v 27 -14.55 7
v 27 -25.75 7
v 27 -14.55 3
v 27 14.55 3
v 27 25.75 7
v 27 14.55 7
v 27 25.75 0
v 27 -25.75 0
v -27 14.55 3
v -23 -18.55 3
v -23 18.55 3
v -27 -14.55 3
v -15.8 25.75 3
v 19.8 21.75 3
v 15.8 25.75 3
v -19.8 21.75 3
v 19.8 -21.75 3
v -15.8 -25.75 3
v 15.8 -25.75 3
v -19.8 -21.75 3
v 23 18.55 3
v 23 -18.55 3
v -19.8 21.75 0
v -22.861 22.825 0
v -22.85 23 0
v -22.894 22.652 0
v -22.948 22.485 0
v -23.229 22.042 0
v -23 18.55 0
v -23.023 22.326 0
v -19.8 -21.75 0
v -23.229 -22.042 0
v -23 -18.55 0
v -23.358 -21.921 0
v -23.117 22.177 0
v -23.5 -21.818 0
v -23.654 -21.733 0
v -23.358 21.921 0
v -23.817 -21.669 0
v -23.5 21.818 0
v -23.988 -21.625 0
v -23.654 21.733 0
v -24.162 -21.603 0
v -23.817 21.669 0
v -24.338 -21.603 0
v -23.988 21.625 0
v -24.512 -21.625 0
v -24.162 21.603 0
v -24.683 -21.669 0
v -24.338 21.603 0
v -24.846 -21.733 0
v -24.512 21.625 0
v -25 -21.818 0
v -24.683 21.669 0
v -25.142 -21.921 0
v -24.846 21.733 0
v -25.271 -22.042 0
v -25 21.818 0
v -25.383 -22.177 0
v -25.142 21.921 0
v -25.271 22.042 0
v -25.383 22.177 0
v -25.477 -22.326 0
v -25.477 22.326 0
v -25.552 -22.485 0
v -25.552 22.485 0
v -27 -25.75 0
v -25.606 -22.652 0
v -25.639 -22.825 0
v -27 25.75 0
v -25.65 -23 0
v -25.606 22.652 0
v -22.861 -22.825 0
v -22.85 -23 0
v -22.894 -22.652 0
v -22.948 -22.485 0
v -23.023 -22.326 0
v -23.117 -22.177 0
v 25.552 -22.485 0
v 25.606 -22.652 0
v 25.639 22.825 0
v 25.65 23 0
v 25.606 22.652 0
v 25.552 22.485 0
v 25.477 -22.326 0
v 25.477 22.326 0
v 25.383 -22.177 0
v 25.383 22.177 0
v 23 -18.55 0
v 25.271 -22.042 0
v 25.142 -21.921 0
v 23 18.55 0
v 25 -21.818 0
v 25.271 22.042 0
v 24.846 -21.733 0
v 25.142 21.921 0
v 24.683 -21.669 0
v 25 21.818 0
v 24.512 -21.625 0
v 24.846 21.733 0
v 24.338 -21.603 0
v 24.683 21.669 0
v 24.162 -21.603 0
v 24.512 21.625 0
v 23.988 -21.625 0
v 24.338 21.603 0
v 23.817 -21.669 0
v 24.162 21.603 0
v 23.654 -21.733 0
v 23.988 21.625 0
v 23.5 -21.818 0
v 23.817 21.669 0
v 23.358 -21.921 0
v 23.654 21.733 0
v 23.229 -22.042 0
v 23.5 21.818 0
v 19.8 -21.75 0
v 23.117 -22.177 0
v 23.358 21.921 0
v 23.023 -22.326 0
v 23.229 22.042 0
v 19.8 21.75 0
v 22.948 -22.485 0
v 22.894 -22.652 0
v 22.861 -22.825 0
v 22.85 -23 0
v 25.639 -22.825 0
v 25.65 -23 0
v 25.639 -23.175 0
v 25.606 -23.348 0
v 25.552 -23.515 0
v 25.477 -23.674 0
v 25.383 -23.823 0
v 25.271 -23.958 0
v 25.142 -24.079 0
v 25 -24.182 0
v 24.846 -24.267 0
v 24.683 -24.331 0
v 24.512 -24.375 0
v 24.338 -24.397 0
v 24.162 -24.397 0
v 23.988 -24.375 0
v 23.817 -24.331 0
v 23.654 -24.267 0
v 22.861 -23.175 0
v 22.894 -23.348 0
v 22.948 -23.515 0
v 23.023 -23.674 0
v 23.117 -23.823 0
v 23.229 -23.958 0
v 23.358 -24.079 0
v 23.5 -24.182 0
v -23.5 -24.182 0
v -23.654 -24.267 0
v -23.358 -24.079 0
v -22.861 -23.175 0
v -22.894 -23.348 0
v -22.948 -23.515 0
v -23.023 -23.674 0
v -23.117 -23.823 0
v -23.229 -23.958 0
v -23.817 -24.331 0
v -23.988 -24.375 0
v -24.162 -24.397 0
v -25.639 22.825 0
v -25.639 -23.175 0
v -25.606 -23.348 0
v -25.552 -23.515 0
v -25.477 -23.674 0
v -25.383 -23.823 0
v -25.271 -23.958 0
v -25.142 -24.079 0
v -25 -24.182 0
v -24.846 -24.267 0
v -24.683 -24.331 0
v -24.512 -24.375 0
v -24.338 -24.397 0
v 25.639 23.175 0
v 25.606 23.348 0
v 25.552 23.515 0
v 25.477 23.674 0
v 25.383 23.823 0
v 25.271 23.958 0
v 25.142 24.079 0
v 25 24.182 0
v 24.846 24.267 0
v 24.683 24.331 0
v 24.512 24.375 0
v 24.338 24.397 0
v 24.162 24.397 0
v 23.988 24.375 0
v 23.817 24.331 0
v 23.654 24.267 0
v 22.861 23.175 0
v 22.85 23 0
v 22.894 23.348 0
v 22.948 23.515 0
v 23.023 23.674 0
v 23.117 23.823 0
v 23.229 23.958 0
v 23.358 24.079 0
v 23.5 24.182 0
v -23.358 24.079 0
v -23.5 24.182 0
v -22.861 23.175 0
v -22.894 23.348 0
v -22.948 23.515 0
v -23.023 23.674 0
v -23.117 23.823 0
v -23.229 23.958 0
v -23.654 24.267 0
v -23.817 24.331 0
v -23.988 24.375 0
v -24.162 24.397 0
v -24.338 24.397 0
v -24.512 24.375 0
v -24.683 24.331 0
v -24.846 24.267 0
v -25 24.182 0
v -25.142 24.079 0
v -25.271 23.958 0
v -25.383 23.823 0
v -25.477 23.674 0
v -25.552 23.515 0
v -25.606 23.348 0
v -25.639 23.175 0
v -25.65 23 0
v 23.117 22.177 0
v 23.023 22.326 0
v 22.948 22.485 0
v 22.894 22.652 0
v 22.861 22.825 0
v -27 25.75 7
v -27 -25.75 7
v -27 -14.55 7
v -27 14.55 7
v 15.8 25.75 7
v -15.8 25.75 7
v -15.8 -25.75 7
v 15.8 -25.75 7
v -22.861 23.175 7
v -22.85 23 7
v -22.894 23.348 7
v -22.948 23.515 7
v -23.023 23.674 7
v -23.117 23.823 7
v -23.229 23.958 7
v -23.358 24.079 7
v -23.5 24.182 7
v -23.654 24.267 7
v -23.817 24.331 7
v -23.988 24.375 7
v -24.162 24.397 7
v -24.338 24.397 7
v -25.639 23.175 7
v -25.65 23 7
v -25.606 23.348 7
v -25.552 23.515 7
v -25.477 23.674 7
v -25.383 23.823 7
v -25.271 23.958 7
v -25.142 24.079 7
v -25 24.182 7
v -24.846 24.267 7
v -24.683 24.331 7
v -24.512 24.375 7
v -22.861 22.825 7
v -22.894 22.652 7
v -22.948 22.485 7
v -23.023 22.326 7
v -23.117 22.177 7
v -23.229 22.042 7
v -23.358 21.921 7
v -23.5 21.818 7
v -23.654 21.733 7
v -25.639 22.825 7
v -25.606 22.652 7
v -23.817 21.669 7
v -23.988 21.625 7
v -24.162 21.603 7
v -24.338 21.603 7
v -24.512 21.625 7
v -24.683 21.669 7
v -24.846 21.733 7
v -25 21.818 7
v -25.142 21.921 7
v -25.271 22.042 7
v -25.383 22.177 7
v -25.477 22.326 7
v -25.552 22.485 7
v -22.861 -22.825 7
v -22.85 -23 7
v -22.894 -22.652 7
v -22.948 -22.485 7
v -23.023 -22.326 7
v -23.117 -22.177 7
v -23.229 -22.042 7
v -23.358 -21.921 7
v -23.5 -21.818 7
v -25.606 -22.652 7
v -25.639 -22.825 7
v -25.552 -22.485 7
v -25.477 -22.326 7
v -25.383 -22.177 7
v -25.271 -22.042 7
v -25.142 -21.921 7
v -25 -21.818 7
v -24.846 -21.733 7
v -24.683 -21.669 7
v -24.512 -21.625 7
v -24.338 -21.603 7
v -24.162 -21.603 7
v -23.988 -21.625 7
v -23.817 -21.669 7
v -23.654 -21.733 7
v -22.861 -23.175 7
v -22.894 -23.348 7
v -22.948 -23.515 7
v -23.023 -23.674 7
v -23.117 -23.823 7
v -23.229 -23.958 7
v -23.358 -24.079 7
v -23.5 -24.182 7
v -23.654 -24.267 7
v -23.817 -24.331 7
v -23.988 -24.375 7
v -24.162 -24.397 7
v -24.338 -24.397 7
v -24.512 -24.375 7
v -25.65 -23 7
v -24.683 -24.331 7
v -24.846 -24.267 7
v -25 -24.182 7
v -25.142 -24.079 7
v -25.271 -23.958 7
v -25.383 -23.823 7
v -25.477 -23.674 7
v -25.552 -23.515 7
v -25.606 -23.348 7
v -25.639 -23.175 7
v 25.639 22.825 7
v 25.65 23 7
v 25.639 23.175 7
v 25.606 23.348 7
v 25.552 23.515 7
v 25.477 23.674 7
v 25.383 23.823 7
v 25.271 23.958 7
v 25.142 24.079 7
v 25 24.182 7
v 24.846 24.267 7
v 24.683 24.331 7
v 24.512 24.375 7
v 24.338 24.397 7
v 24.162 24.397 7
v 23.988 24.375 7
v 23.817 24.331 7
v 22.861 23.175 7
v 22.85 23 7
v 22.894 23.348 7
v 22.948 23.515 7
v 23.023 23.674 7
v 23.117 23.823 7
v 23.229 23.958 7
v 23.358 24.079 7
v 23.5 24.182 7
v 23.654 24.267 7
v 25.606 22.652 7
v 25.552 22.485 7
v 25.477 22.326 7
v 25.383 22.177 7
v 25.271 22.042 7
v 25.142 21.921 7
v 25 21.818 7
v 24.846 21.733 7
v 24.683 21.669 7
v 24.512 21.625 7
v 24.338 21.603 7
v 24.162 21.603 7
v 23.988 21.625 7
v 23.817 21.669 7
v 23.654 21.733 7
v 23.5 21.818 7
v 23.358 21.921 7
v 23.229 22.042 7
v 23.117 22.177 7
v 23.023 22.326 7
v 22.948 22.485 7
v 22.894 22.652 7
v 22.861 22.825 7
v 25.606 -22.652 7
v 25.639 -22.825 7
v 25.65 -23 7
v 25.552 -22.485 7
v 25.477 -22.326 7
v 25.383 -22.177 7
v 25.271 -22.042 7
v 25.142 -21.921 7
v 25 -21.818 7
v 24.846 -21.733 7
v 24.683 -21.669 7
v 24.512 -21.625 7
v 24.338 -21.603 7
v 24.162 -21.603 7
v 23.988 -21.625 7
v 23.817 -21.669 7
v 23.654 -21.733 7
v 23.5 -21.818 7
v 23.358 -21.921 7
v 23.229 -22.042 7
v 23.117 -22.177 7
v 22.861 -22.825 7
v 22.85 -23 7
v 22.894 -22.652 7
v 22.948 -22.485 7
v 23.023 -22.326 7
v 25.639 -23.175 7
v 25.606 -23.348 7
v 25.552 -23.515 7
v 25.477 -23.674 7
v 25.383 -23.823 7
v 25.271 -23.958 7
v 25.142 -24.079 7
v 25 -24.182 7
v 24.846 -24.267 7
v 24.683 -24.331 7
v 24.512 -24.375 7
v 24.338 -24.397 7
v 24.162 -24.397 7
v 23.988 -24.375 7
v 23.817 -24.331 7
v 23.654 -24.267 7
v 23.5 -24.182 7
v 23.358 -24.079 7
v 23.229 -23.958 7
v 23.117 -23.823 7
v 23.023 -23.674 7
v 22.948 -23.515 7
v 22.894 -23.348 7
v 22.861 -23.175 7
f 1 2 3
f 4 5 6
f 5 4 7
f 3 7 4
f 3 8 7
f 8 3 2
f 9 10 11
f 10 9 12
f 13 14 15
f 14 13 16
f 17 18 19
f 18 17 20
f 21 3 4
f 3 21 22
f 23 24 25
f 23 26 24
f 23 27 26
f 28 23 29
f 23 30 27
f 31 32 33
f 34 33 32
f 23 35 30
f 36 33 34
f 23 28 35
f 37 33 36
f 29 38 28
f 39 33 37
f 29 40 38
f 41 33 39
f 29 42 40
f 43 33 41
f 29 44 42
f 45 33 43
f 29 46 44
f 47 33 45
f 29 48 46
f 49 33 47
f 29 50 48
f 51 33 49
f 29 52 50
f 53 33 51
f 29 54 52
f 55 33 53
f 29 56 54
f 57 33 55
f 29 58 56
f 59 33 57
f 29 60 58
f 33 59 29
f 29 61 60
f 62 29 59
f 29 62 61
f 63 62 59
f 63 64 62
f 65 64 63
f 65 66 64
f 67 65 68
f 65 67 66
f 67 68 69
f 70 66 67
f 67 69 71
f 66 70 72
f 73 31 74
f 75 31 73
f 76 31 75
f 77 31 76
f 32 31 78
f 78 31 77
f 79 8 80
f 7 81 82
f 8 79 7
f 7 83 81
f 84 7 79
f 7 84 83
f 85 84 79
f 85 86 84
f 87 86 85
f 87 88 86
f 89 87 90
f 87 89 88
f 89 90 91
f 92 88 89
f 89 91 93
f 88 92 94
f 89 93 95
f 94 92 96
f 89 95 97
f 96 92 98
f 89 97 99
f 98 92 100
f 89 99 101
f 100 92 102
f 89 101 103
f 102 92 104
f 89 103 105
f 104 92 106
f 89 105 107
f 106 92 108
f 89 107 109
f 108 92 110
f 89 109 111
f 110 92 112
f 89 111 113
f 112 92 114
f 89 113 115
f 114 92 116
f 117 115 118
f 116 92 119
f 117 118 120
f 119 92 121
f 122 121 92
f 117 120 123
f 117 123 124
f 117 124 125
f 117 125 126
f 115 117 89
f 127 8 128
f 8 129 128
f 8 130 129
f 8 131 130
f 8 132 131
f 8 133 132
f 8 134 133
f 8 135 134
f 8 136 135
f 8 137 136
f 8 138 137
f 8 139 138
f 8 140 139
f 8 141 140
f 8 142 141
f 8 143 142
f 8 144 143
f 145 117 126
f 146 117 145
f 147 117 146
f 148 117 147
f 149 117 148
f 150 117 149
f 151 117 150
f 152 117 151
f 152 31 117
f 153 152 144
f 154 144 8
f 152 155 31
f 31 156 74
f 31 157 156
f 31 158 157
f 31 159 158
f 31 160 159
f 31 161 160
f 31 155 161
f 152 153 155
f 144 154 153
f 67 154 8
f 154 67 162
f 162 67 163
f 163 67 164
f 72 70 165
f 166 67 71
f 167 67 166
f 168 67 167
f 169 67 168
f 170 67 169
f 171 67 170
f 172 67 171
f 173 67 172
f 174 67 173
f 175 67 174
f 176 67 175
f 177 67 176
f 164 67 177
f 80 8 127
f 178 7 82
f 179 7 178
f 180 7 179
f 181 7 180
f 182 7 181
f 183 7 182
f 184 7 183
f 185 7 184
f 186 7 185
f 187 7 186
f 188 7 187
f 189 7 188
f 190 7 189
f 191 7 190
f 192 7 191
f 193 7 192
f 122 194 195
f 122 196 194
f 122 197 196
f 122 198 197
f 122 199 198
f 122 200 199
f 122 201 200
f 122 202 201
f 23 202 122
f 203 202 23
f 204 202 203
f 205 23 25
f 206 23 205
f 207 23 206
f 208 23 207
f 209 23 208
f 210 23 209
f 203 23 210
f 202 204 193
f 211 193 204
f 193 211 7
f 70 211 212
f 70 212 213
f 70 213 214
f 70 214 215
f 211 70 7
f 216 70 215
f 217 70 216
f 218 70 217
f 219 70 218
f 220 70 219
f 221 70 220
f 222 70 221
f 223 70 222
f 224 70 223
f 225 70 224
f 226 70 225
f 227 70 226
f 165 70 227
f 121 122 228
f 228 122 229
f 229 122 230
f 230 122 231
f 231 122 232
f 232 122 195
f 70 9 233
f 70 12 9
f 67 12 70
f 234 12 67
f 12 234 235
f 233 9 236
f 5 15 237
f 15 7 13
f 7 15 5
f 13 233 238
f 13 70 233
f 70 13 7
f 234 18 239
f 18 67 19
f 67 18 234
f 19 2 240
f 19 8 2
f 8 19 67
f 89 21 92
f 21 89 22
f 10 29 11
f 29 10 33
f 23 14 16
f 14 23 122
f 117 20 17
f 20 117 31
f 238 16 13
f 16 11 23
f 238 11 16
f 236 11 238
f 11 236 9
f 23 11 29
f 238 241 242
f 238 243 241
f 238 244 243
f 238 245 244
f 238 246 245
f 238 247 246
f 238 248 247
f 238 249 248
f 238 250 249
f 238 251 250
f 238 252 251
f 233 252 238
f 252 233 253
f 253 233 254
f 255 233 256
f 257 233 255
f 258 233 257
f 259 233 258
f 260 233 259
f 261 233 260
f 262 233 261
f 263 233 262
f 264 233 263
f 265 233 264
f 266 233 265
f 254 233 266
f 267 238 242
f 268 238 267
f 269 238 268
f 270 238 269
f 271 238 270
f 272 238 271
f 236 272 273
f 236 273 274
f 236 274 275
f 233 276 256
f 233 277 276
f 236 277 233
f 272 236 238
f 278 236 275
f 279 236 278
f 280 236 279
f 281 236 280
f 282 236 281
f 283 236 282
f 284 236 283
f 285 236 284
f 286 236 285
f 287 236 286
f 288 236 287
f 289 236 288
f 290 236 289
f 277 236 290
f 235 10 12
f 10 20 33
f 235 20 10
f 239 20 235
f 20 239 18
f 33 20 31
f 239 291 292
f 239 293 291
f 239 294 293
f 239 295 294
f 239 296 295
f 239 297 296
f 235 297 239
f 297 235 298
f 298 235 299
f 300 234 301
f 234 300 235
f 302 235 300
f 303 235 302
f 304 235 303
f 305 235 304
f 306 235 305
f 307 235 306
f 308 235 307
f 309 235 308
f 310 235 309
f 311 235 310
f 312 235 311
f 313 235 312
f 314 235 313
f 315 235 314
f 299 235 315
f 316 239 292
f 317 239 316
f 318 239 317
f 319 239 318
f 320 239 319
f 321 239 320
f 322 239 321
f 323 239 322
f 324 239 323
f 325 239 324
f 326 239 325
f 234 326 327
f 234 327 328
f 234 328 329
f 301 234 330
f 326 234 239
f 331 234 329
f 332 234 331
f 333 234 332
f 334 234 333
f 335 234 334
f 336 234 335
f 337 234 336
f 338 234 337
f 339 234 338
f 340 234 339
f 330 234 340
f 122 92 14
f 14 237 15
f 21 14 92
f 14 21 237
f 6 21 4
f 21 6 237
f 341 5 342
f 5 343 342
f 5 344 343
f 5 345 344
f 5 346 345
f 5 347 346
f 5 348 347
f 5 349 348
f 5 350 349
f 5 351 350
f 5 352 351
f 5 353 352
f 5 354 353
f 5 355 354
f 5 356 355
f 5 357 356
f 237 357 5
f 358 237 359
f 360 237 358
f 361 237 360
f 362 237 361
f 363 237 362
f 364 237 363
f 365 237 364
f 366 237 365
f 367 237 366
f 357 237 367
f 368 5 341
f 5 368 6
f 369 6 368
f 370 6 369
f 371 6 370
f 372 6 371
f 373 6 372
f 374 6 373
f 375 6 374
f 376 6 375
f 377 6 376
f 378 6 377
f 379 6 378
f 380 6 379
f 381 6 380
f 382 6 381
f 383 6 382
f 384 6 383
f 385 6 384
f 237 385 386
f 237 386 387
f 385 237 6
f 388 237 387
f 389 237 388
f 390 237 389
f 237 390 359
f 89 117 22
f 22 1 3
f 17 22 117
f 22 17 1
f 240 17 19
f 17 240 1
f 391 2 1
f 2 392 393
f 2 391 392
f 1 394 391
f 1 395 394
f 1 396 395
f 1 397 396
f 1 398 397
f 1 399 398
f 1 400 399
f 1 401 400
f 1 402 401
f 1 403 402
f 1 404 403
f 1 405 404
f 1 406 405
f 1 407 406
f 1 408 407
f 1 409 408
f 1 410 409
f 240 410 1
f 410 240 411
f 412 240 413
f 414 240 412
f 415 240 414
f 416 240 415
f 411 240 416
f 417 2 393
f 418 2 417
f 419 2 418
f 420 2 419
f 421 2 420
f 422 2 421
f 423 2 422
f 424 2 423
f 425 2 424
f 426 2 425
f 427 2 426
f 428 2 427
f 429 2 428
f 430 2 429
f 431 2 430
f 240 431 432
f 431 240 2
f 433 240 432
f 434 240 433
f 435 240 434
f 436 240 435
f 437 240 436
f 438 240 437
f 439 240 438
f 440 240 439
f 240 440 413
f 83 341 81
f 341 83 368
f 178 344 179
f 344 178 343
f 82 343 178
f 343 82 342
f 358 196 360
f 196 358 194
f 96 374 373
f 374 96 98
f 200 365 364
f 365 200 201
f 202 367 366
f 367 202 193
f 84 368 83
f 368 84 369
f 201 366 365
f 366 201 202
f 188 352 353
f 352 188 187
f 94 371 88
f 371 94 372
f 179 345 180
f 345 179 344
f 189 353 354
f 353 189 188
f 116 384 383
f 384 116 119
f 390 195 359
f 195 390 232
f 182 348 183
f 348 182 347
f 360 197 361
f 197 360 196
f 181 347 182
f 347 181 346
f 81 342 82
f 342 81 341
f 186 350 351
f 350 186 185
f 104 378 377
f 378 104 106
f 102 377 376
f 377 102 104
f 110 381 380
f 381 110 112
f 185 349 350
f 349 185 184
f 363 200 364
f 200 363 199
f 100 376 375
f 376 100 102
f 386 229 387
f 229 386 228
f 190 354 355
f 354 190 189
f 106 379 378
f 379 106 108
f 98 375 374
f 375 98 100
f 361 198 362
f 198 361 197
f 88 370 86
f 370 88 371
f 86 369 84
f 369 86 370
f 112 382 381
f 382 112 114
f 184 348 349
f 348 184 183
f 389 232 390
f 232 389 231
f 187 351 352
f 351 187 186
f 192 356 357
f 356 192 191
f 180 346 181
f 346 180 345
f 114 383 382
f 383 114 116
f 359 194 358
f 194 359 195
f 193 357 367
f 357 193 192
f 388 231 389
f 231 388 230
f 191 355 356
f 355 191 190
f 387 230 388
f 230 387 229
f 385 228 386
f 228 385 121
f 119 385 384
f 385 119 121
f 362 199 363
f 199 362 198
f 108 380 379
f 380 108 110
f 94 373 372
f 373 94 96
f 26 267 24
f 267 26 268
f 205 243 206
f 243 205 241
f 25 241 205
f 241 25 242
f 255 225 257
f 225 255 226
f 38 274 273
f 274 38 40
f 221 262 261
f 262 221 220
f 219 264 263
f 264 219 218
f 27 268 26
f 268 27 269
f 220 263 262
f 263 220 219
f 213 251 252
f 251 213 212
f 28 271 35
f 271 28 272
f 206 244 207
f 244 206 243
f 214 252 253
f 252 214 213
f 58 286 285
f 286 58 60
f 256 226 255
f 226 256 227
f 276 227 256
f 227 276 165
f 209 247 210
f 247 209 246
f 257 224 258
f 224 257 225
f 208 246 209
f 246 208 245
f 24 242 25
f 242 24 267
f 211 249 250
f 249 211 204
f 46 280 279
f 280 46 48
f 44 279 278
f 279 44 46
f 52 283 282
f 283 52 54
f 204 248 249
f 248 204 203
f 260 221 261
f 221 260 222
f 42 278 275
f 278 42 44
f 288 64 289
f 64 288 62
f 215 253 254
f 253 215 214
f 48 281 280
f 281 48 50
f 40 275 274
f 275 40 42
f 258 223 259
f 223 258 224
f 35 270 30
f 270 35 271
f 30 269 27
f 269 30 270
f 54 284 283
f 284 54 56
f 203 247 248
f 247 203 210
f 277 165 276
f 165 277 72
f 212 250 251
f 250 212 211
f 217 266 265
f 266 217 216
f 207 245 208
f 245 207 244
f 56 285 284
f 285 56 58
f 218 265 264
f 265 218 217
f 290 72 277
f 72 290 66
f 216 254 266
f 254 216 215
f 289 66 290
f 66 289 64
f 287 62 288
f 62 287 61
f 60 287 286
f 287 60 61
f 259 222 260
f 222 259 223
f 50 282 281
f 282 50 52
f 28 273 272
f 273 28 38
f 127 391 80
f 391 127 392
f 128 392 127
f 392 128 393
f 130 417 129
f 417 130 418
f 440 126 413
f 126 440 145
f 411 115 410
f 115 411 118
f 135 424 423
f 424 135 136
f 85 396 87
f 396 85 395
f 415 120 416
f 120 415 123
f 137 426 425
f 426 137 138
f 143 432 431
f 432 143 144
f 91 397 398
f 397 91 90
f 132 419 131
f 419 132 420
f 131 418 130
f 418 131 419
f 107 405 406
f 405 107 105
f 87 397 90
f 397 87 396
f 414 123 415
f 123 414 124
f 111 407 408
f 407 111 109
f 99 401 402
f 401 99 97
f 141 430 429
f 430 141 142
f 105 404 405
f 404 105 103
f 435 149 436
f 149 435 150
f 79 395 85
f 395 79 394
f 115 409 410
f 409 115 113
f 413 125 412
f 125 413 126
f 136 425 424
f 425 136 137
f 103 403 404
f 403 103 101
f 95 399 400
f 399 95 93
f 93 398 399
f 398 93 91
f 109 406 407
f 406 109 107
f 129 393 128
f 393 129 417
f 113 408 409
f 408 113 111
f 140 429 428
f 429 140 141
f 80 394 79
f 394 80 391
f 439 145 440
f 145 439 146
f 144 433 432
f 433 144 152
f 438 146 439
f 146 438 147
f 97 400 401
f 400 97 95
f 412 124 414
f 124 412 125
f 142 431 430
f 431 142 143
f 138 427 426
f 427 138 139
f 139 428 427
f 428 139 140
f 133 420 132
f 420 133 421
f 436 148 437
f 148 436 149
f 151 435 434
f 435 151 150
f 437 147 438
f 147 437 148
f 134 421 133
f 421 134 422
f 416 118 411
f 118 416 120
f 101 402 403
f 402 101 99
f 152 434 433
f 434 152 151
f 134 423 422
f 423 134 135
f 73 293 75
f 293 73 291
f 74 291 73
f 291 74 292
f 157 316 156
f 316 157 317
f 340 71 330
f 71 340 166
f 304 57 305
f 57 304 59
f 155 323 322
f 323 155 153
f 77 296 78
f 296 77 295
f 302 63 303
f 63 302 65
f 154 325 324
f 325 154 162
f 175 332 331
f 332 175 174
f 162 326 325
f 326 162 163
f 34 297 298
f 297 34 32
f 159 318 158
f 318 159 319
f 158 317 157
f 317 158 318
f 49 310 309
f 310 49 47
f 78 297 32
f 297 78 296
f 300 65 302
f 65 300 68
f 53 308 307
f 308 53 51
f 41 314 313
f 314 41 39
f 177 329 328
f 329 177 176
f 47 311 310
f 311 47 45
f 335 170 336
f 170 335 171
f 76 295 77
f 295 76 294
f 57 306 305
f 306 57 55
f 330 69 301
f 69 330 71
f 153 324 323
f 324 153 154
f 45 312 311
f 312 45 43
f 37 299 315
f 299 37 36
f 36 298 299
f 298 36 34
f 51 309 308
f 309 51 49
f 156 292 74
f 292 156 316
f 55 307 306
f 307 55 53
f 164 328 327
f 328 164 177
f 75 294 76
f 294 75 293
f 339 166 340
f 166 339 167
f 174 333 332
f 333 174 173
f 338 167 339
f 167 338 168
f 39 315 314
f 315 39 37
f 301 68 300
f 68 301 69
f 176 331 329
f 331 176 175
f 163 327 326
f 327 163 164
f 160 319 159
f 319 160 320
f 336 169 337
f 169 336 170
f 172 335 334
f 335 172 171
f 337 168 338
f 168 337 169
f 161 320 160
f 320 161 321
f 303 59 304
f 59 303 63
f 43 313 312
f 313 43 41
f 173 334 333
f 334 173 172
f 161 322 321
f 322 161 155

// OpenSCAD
// file: ../library_deh/mag_mount.scad
/* mag_mount.scad

 * ****** Stud magnets ******
16 mm 
http://www.kjmagnetics.com/proddetail.asp?prod=MM-C-16
    Dimensions:
        D=16mm (0.63")
        M=4mm (0.16") (M4 Coarse Male threaded stud)
        H=13mm (0.51")
        h=5mm (0.20")
    Material: NdFeB, Grade N38
    Plating/Coating: Ni-Cu-Ni (Nickel)
    Magnetization Direction: Axial (Poles on Flat Ends)
    Weight: 0.26 oz. (7.37 g)
    Pull Force: 12.1 lbs
    Surface Field: N/A
    Brmax: 12,600 Gauss
    BHmax: 38 MGOe
   $2.49
*/
// Measured dimensions -- 16 mm ** M3 ** stud (default)
 mag_thick = 4.82;	    // Magnet thickness (base to shell top)
 mag_shell_dia = 16.0;	    // Magnet shell OD
 mag_shell_flat_dia = 11;   // Dia of flat of magnet
 mag_stud_dia = 2.8;        // Dia of mounting magnet studs (4-40)
 mag_stud_len = 8.0;        // Height of stud from magnet back
 mag_washer_thick = 1.1;    // Thickness of washer
 mag_nut_thick = 2.4;       // Stud nut (M3) thickness
 mag_nut_hex_flat = 5.41;   // Nut across flats
 mag_nut_hex_peak = 6.20;   // Nut across peaks (also dia of nut)
 mag_washer_dia = 7.1; // 9.5;// Diameter of washer for magnet stud
 mag_washer_dia_extra = 2;  // Washer slop

// Measured dimensions 16 mm -- ** M4 ** stud
 mag16_M4_thick = 5.21;	     // Magnet thickness (base to shell top)
 mag16_M4_shell_dia = 16.0;	     // Magnet shell OD
 mag16_M4_shell_flat_dia = 11.7;  // Dia of flat of magnet
 mag16_M4_stud_dia = 3.64;        // Dia of mounting magnet studs (M4)
 mag16_M4_stud_len = 8.18;        // Height of stud from magnet back
 mag16_M4_nut_thick = 2.98;       // Stud nut (M4) thickness
 mag16_M4_nut_hex_flat = 6.85;    // Nut across flats
 mag16_M4_nut_hex_peak = 7.89;    // Nut across peaks (also dia of nut)
 mag16_M4_washer_thick = 0.85;    // Thickness of washer
 mag16_M4_washer_dia = 8.68;      // Diameter of washer for magnet stud
 mag16_M4_washer_inner_dia = 5.3; // Washer hole diameter
 mag16_M4_washer_dia_extra = 0.5; // Washer slop


/*
http://www.kjmagnetics.com/proddetail.asp?prod=MM-C-20
    Dimensions:
        D=20mm (0.79")
        M=4mm (0.16") (M4 Coarse Male threaded stud)
        H=15mm (0.59")
        h=7mm (0.28")
    Material: NdFeB, Grade N38
    Plating/Coating: Ni-Cu-Ni (Nickel)
    Magnetization Direction: Axial (Poles on Flat Ends)
    Weight: 0.53 oz. (15.0 g)
    Pull Force: 28.7 lbs
    Surface Field: N/A
    Brmax: 12,600 Gauss
    BHmax: 38 MGOe

  $3.14
*/
 mag20_thick = 7.11;	       // Magnet thickness (base to shell top)
 mag20_shell_flat_dia = 20.2;  // Magnet shell OD
 mag20_stud_dia = 3.75;        // Dia of mounting magnet stud at base
 mag20_stud_len = 7.75;        // Height of stud from magnet back
 mag20_washer_thick = 0.85;    // Thickness of washer
 mag20_nut_thick = 2.93;       // Nut for stud thickness
 mag20_nut_hex_peak = 7.89; // Nut across peaks (also dia of nut)
 mag20_washer_dia = 8.68;      // Diameter of washer for magnet stud
 mag20_washer_dia_extra = 0.5; // Washer slop

/*
http://www.kjmagnetics.com/proddetail.asp?prod=MM-C-25

    Dimensions:
        D=25mm (0.98")
        M=5mm (0.20") (M5 Coarse Male threaded stud)
        H=17mm (0.67")
        h=8mm (0.32")
    Material: NdFeB, Grade N38
    Plating/Coating: Ni-Cu-Ni (Nickel)
    Magnetization Direction: Axial (Poles on Flat Ends)
    Weight: 0.92 oz. (26.1 g)
    Pull Force: 48.5 lbs
    Surface Field: N/A
    Brmax: 12,600 Gauss
    BHmax: 38 MGOe
  $4.20
*/
// 25 mm M5
 mag25_thick = 7.75;	      // Magnet thickness (base to shell top)
 mag25_shell_dia = 25.17;     // Magnet shell OD
 mag25_shell_flat_dia = 20;   // Dia of flat of magent
 mag25_stud_dia = 4.82;       // Dia of mounting magnet studs (M5)
 mag25_stud_len = 9.3;        // Height of stud from magnet back
 mag25_washer_thick = 0.97;   // Thickness of washer
 mag25_nut_thick = 3.96;      // M5 Nut for stud thickness
 mag25_nut_hex_flat = 7.93;   // M5 nut across flats
 mag25_nut_hex_peak = 9.16;   // M5 nut across peaks (also dia of nut)
 mag25_washer_dia = 9.8;      // Washer diameter of washer for magnet stud
 mag25_washer_inner_dia = 5.3;// Washer hole diameter
 mag25_washer_dia_extra = 0.5;  // Washer slop

// Cylindrical magnets
mag_cyl_dia = 6.5; 
mag_cyl_ht = 5.05;
// file: ../library_deh/ridged_screw_hole.scad
/*
file: ridged_screw_hole.scad
2018 01 18
*/
/*
All results are translated so that inside edges of the ridges are aligned with the axis, so a 
square or rectangle will have the corner centered on the x,y origin.

Modules----
module ridged_rectangle(xlen,ylen,zlen,rht,rwdy)
module corner_ridged_rectangle(xlen,ylen,zlen,rht,rwdx,rwdy)
module corner_ridged_square(slen,zlen,rht,rwds)
module corner_ridged_square_w_screw(slen,zlen,rht,rwds,scd1,scd2,sch,scofx,scofy)
module corner_ridged_rectangle_w_screw(xlen,ylen,zlen,rht,rwdx,rwdy,scd1,scd2,sch,scofx,scofy)
module ridged_rectangular_w_clip(xlen,ylen,zlen,rht,rwdy,clen)
*/

include <deh_shapes.scad>

/*  ***** ridged_rectangle *****
* xlen = x axis direction length
* ylen = y axis direction length
* zlen = z axis, height to ledge
* rht  = ridge thickness
* rwdy = ridge width, y direction
* NOTE: to convert from right orientation use
* mirror([1,0,0]) for left orientation
*/
module ridged_rectangle(xlen,ylen,zlen,rht,rwdy)
{
	corner_ridged_rectangle(xlen,ylen,zlen,rht,0,rwdy);
}

/*  ***** corner_ridged_rectangle *****
* xlen = x axis direction length
* ylen = y axis direction length
* zlen = z axis, height to ledge
* rht  = ridge thickness
* rwdx = ridge width, x direction
* rwdy = ridge width, y direction
*/
module corner_ridged_rectangle(xlen,ylen,zlen,rht,rwdx,rwdy)
{
    cx = rwdx; cy = -rwdy;
    translate([-cx,cy,0])
    {
        difference()
        {
            union()
            {
                zht1 = (zlen+rht);
                cube([xlen,ylen,zht1],center=false);
            }
            union()
            {
                zht2 = rht+0.1;
                translate([rwdx,rwdy,zlen])
                    cube([xlen,ylen,zht2],center=false);
            }
        }
    }        
}

/*  ***** corner_ridged_square_w_screw *****
* slen = length x & y axis directions
* zlen = z axis, height to ledge
* rht  = ridge thickness
* rwds = ridge width, x & y directions
*/
module corner_ridged_square(slen,zlen,rht,rwds)
{
    corner_ridged_rectangle(slen,slen,zlen,rht,rwds,rwds);
}

/*  ***** corner_ridged_square_w_screw *****
* slen = length x & y axis directions
* zlen = z axis, height to ledge
* rht  = ridge thickness
* rwds = ridge width, x & y directions
* scd1 = screw diameter at top
* scd2 = screw diameter at bottom of screw
* sch  = screw hole height
* scofx = screw hole center offset from inside ridge corner, x
* scofy = screw hole center offset from inside ridge corner, y
*/
        //corner_ridged_square_w_screw(  10,  5, 1.5,  4,  3.2,  1.2,  3,  -1.4,  -1.4  ); // test
module corner_ridged_square_w_screw(slen,zlen,rht,rwds,scd1,scd2,sch,scofx,scofy)
{
    difference()
    {
        corner_ridged_square(slen,zlen,rht,rwds);
        
        translate([0,0,zlen-sch+rht+.01])
            ridge_screw_hole_square(slen,rwds,rwds,scd1,scd2,sch,scofx,scofy);
    }
}

/*  ***** corner_ridged_rectangle_w_screw *****
* xlen = x axis direction length
* ylen = y axis direction length
* zlen = z axis, height to ledge
* rht  = ridge thickness
* rwdx = ridge width, x directions
* rwdy = ridge width, y directions
* scd1 = screw diameter at top
* scd2 = screw diameter at bottom of screw
* sch  = screw hole height
* scofx = screw hole center offset from inside ridge corner, x
* scofy = screw hole center offset from inside ridge corner, y
*/
//translate([20,0,0])
//                                xlen ylen zlen rht dx dy   scd1 scd2  sch  scofx scofy
//corner_ridged_rectangle_w_screw(6,  12,    5, 1.5, 5, 4,    3.2, 2.2,   4,  -1.5,  -2.0); // Test right
//translate([-6,0,0])
//corner_ridged_rectangle_w_screw(6,  12,    5, 1.5, -3, 4,    3.2, 2.2,   4,  -1.5+6,  -2.0); // Test left
module corner_ridged_rectangle_w_screw(xlen,ylen,zlen,rht,rwdx,rwdy,scd1,scd2,sch,scofx,scofy)
{
    difference()
    {
        corner_ridged_rectangle(xlen,ylen,zlen,rht,rwdx,rwdy);
        
        translate([0,0,zlen-sch+rht+.01])
            ridge_screw_hole_rectangle(xlen,ylen,rwdx,rwdy,scd1,scd2,sch,scofx,scofy);
    }
}
/*
* xlen = x axis direction length
* ylen = y axis direction length
* rwdx = ridge width, x directions
* rwdy = ridge width, y directions
* scd1 = screw diameter at top
* scd2 = screw diameter at bottom of screw
* sch  = screw hole height
* scofx = screw hole center offset, x
* scofy = screw hole center offset, y
*/
module ridge_screw_hole_rectangle(xlen,ylen,rwdx,rwdy,scd1,scd2,sch,scofx,scofy)
{
    hx =  scofx;
    hy =   scofy;
//echo("ridge_screw_hole_rectangle","rwdx",rwdx,"rwdy",rwdy);
//echo("ridge_screw_hole_rectangle","scofx",scofx,"scofy",scofy,"hy",hy,"hx",hx);
//echo ("ridge_screw_hole_rectangle",sch);
    translate([hx,hy,0])
        cylinder(d1=scd2,d2=scd1,h=sch,center=false,$fn=25);    
}

module ridge_screw_hole_square(slen,rwdx,rwdy,scd1,scd2,sch,scofx,scofy)
{
    ridge_screw_hole_rectangle(slen,slen,rwdx,rwdy,scd1,scd2,sch,scofx,scofy);
}

/*
pst_ldg = 6 + bfthick;	// Height of pc board ledge from bottom
pst_wid = 3;	// Width of post
pcb_thick = 2.0;	// Thickness of pcb
clip_ht = 3;
pst_w2 = 1;	// Width where pcb contacts edge
*/

/*  ***** ridged_rectangular_w_clip *****
* xlen = x axis direction length
* ylen = y axis direction length
* zlen = z axis, height to ledge
* rht  = height of ridge (pcb thickness)
* rwdy = ridge width, y direction
* clen = clip length
* Orientation: ridge runs in y-axis direction 
* Note: ledge with is (xlen - rwdy)
*/
//         ridged_rectangular_w_clip(  3,  15,   5, 1.5, 1,   3 );	// Test
module ridged_rectangular_w_clip(xlen,ylen,zlen,rht,rwdy,clen)
{
	corner_ridged_rectangle(xlen,ylen,zlen,rht,rwdy,0);

	// Clip overhang
	cofsx = clen - rwdy;	// Offsets for wedge
 	cofsy = ylen;
	cofsz = zlen+rht+clen - rwdy;
	translate([cofsx,cofsy,cofsz])
		rotate([0,180,0])
		rotate([0,0,-90])
		wedge(ylen,clen,clen);

}
// file: ../library_deh/fasteners.scad
/* ***** fasteners.scad *****
 * library of measurements of 
 *   screws, washers, etc.
 * date: 20170512
*/

// 6-32
screw_dia_s632 = 3.35;	// shaft diameter
screw_dia_ph632 = 6.62;	// pan-head diameter
screw_dia_pht632 = 2.2;	// pan-head thickness
nut_dia_632 = 8.77 ;	// peak-peak 
nut_thick_632 = 2.77;	// thickess

// 4-40
screw_dia_s440 = 2.72;	// shaft diameter
screw_dia_s440_z = 1.90; // Dia at tip
screw_dia_ph = 5.42;	// pan-head diamter
screw_dia_pht = 1.7;	// pan-head thickness
nut_dia_440 =  7.12;	// peak-peak
nut_thick_440 = 2.41;	// thickess
nut_dia_440L = 8.88;	// Lock nut diameter
nut_thick_440L = 4.6;	// Lock nut thickness

// 6-20 self-tap
screw_dia_sod620 = 3.5;	// Outer diameter of threads
screw_dia_sth620 = 2.6;	// Self tap hole
screw_dia_pht = 6.7;	// pan-head diameter

// #4
washer_od_4 = 8.0;		// Washer outer diameter
washer_id_4 = 3.2;		// Washer inner diameter
washer_thick_4 = .94;	// Washer thickness

// #6
washer_od_6 = 9.46;	// Washer outer diameter	
washer_id_6 = 4.04;	// Washer inner diameter
washer_thick = 1.04;	// Washer thickness
washer_thick_6 = 1.04;	// Washer thickness

// M3
nut_dia_M3 = 6.5; 
nut_flat_M3 = 5.43;
nut_thick_M3 = 2.29;
washer_od_M3 = 6.9;	// Washer outside diameter
washer_id_M3 = 3.22;	// Washer inside (hole) diameter
washer_thick_M3 = .57;	// Washer thickness

// M4
nut_dia_M4 = 7.86;
nut_flat_M4 = 6.75;
nut_thick_M4 = 2.96;

// #2 6 self drilling Philips Screw (MSC: 124751)
screw_dia1_ss6 = 3.5;	// Self-tapping: dia at threads
screw_dia2_ss6 = 2.8;	// Self-tapping: dia at drilling end
screw_dia_he_ss6 = 6.7;	// Self-tapping: dia of pan head
// file: ../library_deh/Plano_frame.scad
/* File: Plano_frame.scad
 * Plano enclosure PC board fame
 * Author: deh
 * Latest edit: 201700701
 */

include <mag_mount.scad>

 $fn=100;
 
 // Inside dimensions of Plano box
 plano_len          = 152.5;   // flat-flat
 plano_wid          =  76.0;   // flat-flat

base_len = plano_len;
base_wid = plano_wid;
base_ht  = 3.2;		// Thickness of base plate
base_rnd = 10;	// Base plate corner rounding radius
 
 // Stud magnet relative postions.
 // Bottom magnet is on center-line and x,y reference is 0,0
 plano_mag_top_x  = 30.5;   // Top pair x +/- from center-line (C/L)
 plano_mag_top_y  = 138.69; // Top pair y from bottom magnet hole
 plano_mag_top_ofs = 8;    // Top mags to top edge of PC board max
 // Bottom mag distance from bottom of plano wall
 plano_mag_bot_ofs = plano_len - plano_mag_top_ofs - plano_mag_top_y;
 
 
 plano_offs_mag_y   = 4;    // Offset from edge for magnet hole
 plano_offs_mag_x   = 4;    // Offset from edge for magnet hole
 plano_ctr_y    = (plano_len/2);
 plano_ctr_x    = (plano_wid/2);
  
 plano_mag_stud = mag_stud_dia;  // Dia of mounting magnet studs (4-40)
 plano_mag_stud_len = mag_stud_len; // Height of stud from magnet back
 mag_washer_dia = 9.5;      // Diameter of washer for magnet stud
 mag_washer_thick = 1.1;    // Thickness of washer
 mag_washer_dia_extra = 1;  // Washer slop
 plano_web_thick = 2;   // Plano box thickness where stud is 
 mag_wash_recess_dia = mag_washer_dia + mag_washer_dia_extra;

 // Thickness of base for washer recess
 mag_stud_z = (mag_washer_thick +mag_nut_thick + plano_web_thick);
 mag_wash_recess_z = plano_mag_stud_len - mag_stud_z;    

 // Diameter of recess
 mag_wash_recess_dia = mag_washer_dia + mag_washer_dia_extra;

 // POD board
 pod_wid = 76.0;  // Overall width
 pod_len = 89.4;  // Overall length

// Discovery board
 dis_wid = 65.4;  // Overall width
 dis_len = 95.8;  // Overall length
 
// RJ45 connector on POD board
 RJ_offset=24.8; // Side of RJ45 jack from edge
 RJ_wid=15;      // Width of RJ 45 jack
 RJ_depth=14.5;  // Bottom of POD pc board edge to bottom/back of RJ45
 RJ_length=14;  // Front-Back length

// Cutout in base for RJ45 with plug
 RJ_slop = 4;
 RJ_plug_len = 14; // RJ plug protrudes beyond jack
 RJ_cutout_width = RJ_wid + RJ_slop;
 RJ_cutout_length = RJ_length + RJ_slop + RJ_plug_len;
 RJ_cutout_ofs = pod_wid/2 - (RJ_offset + RJ_wid);
 
 // CAN sub-board module
 sub_wid      = 33.75;  // Overall width
 sub_len      = 62.9;   // Overall lengh
 sub_mtg_wid  = 26.6;   // Between mounting holes, width
 sub_mtg_len  = 57.0;   // Between mounting holes, length 

 // Switcher module
 sw_wid =   20.3;   // Overall width
 sw_len =   41.2;   // Overall length
 sw_mtg_off_out_y   = 5.56; // Offset from edge "out" mounting hole 
 sw_mtg_off_out_x   = 2.7;  // Offset from edge "out" mounting hole 
 sw_mtg_off_in_y    = 3.1;  // Offset from edge "in" mounting hole
 sw_mtg_off_in_x    = 6.0;  // Offset from edge "in" mounting hole
 
 // RJ jack (load-cell jack)
 rj_grv =  4.0;  // Groove Depth 
 rj_ht  = 14.2;  // Groove Length
 rj_wid = 14.2;  // Groove Height
 
 // Post ridge
 p_ridge = 1.5; // Height of ridge to position PC board on post
 p_offset = 2;  // Offset of ridge from edge of post
 
 // Pod post
 pod_post_ht = (RJ_depth + 1);
 pod_post_y = 9;    // Length in "y" (long/length) box direction)
 pod_post_x = 6;    // Length in "x" (short/width) box direction)
 pod_post_q = 2.0;  // Width of ridge
 pod_post_s = 2.5;    // Screw hole dia
 pod_post_sd = 5;   // Screw hole depth

 // Pod board clip
 pcwide = 4;        // Width of clip post
 pcleng = 50;       // X axis direction length
 pc_y = base_len;   // y positioning

 iso_len   = 50.2;	// Length: two RJ 45 jacks parallel
 iso_wid   = 46.3;      // Width
 iso_thick = 1.6;	// PC board thickness
 iso_slop  = 0.0;	// Allowance for board variation
 iso_lip   = 1.2;	// Ledge width for board seating
 iso_ridge_ht = 1.55;	// Ridge ht for seat
 iso_ridge_wid= 1.5;	// Ridge width for seat
 iso_post_ht = 3.6;//6.0;	// Height of lip above base

 iso_osd_y = iso_wid + iso_slop - 0.5; // Board y
 iso_osd_x = iso_len + iso_slop - 0.5; // Board x
 iso_side  = iso_lip + iso_ridge_wid;
// file: ../library_deh/deh_shapes2.scad
/* **** deh_shapes2.scad *****
   * Library of useful shapes: chamfers
   * 20180126
*/
//include <../library_deh/deh_shapes.scad>

/* ***** chamfered_corner **********************
 * cx, cy form triangle for bottom chamfer
 * rad = z axis radius for corner
*/ 
module chamfered_corner(cx,cy,rad)
{
    rotate_extrude(angle=90)
        translate([rad,0,0])
            polygon(points=[[0,0],[0,cy],[cx,cy]]);    
}
/* ***** chamfered_rectangle *******************
 * wid  = width, x direction 
 * slen = length, y direction
 * cut  = x & y direction of chamfer
 * rad  = z axis, radius of corner rounding
*/
module chamfered_rectangle(wid,slen,cut,rad)
{
    ofs = cut+rad;
  hull()
  {  
    translate([-wid/2+ofs,ofs,0])
      rotate([0,0,180])
        chamfered_corner(cut,cut,rad);

    translate([ wid/2-ofs,ofs,0])
      rotate([0,0,-90])
        chamfered_corner(cut,cut,rad);

    translate([-wid/2+ofs,slen-ofs,0])
      rotate([0,0,90])
        chamfered_corner(cut,cut,rad);
    
    translate([ wid/2-ofs,slen-ofs,0])
      rotate([0,0,0])
        chamfered_corner(cut,cut,rad);
  } 
}
/* ***** rounded_rectangle_hull ********************
 * wid  = width, x direction 
 * slen = length, y direction
 * ht   = height (or thickness if you prefer)
 * cut  = x & y direction of chamfer
 * rad  = z axis, radius of corner rounding
*/
module rounded_rectangle_hull(wid,slen,ht,cut,rad)
{
 hull()
 {    
    translate([-wid/2+rad,rad,0])
        cylinder(r=rad,h=ht,center=false);

   translate([ wid/2-rad,rad,0])
        cylinder(r=rad,h=ht,center=false);

    translate([-wid/2+rad,slen-rad,0])
        cylinder(r=rad,h=ht,center=false);
    
    translate([ wid/2-rad,slen-rad,0])
        cylinder(r=rad,h=ht,center=false);
 }
}
module half_rounded_rectangle_hull(wid,slen,ht,cut,rad)
{
    ofs= rad;
 hull()
 {    
    translate([-wid/2+ofs,ofs,0])
        cylinder(r=ofs,h=ht,center=false);

    translate([ wid/2-ofs,ofs,0])
        cylinder(r=ofs,h=ht,center=false);

    translate([-wid/2+0.05,slen-0.05,0])
        cylinder(r=0.05,h=ht,center=false);
    
    translate([ wid/2-0.05,slen-0.05,0])
        cylinder(r=0.05,h=ht,center=false);
 }
}

/* ***** composite_chamfered_rectangle **************
 * wid  = width, x direction 
 * slen = length, y direction
 * ht   = height (or thickness if you prefer)
 * cut  = x & y direction of chamfer
 * rad  = z axis, radius of corner rounding less cut
 * NOTE: this places a rounded rectangular cube on top
 *   of a rounded rectangle with a bottom chamfer,
 *   i.e. this is a "base" for a Plano box.
*/
module composite_chamfered_rectangle(wid,slen,ht,cut,rad)
{
echo("composite_chamfered_rectangle","cut",cut,"ht",ht,"rad",rad);    
    chamfered_rectangle(wid,slen,cut,rad);

    translate([0,0,cut])
        rounded_rectangle_hull(wid,slen,ht-cut,cut,rad+cut);
}
//composite_chamfered_rectangle(66,86,5,4,3); // test this module

/* ***** dual_fillet ******************************
 * d  = distance between inside of wedges (x)
 * l  = length (z)
 * w  = width of fillet (x)
 * h  = height of fillet (y)
 */
module dual_fillet(d,l,w,h)
{
	q = d/2;
	  linear_extrude(height = l)
  polygon(points = [[-q,0],[-q,-h],[-q-w,0]]);

	  linear_extrude(height = l)
  polygon(points = [[q,0],[q,-h],[q+w,0]]);
}
/* ***** chamfered_rounded_slot(d,l,t,w,h)
 * d = diameter of rounded end and width of slot (x)
 * l = length (z)
 * t = depth of slot (y) from top to bottom center of circle
 * w = width of fillet at top (x)
 * h = height of fillet (y)
*/
module chamfered_rounded_slot(d,l,t,w,h)
{
	dual_fillet(d,l,w,h);

	    // Rounded end
	translate([0,-t,0])
    cylinder(d = d, h = l, center = false, $fn = 50);

    // Bar
    translate([-d/2, -t, 0])
       cube([d, t, l],false);
}
//chamfered_rounded_slot(4,10,5,1,2); // test
// file: ../library_deh/deh_shapes.scad
/* **** deh_shapes.scad *****
   * Library of useful shapes
   * 20170512
*/

/*  ***** tubedeh *****
d1 = outside diameter
d2 = inside diameter
ht = height
module tubedeh(d1,d2,ht)
reference is center of tube, bottom
*/

module tubedeh(d1,d2,ht)
{
   difference()
   {
     cylinder(d = d1, h = ht, center = false);
     cylinder(d = d2, h = ht + .001, center = false);
   }
}
/* ***** rounded_bar *****
 * rectangular bar with rounded end
bar with one end rounded
rounded_bar(d, l, h)
d = diameter of rounded end, and width of bar
l = length of bar from center of rounded end to end
h = thickness (height) of bar
reference is center of rounded end, bottom
*/
module rounded_bar(d, l, h)
{
    // Rounded end
    cylinder(d = d, h = h, center = false);
    // Bar
    translate([0, -d/2, 0])
       cube([l, d, h],false);
}
/* ***** eyebar *****
 * rounded bar with hole in rounded end
 * module eye_bar(d1, d2, len, ht)
d1 = outside diameter of rounded end, and width of bar
d2 = diameter of hole in end of bar
eye_bar(d1, d2, len, ht);
*/
module eye_bar(d1, d2, len, ht)
{
   difference()
   {   
      rounded_bar(d1,len,ht);
      cylinder(d = d2, h = ht + .001, center = false);
   }
}
/* ***** rounded_rectangle ******
rounded_rectangle(l,w,h,rad);
l = length (x direction)
w = width (y direction)
h = thickness (z direction)
rad = radius of corners
reference = center of rectangle x,y, bottom
*/
module rounded_rectangle(l,w,h,rad)
{
  translate([-(l-rad)/2,-(w-rad)/2,0])
  {
    // Four rounded edges
    translate([0,0,0])
      rounded_bar(rad*2,l-rad,h);
    translate([l-rad,0,0])
      rotate([0,0,90])
      rounded_bar(rad*2,w-rad,h);
    translate([l-rad,w-rad,0])
      rotate([0,0,180])
      rounded_bar(rad*2,l-rad,h);
    translate([0,w-rad,0])
      rotate([0,0,-90])
      rounded_bar(rad*2,w-rad,h);
    // Fill in center
    translate([0,0,0])
      cube([l-rad + .01,w-rad + .01,h],false);
  }
}

/* ***** rounded rim *****
module rounded_rim(l,w,h,rad,tk);
l = length (inside, x direction)
w = width (inside, y direction)
h = thickness (z direction)
rad = radius of corners
tk = thickness of rim wall
*/
module rounded_rim(l,w,h,rad,tk)
{
  difference()
  {
    rounded_rectangle(l+2*tk,w+2*tk,h,rad);
    rounded_rectangle(l, w, h, rad);
  }
}

/* ***** wedge *****
 * l = length
 * w = width
 * h = height/thickness
 * wedge(l, w, h)
*/
 module wedge(l, w, h)
 {
   polyhedron(
      points=[[0,0,0], [l,0,0], [l,w,0], [0,w,0], [0,w,h], [l,w,h]],
       faces=[[0,1,2,3],[5,4,3,2],[0,4,5,1],[0,3,4],[5,2,1]] );
 }
/* **** wedge_isoceles) ****
 * l - z axis length
 * w - y axis length 
 * h - x axis length
 * reference: [0, w/2, 0]
 * wedge_isoceles(l, w, h);
 */

module wedge_isoceles(l, w, h)
 {
  translate([0,0,l])
   rotate([0,90,0])
    translate([0,-w/2,0])
     polyhedron(
      points=[[0,0,0], [l,0,0], [l,w,0], [0,w,0], [0,w/2,h], [l,w/2,h]],
       faces=[[0,1,2,3],[5,4,3,2],[0,4,5,1],[0,3,4],[5,2,1]] );
 }
/* ***** rounded_triangle *****
 * l1 = side 1
 * l2 = side 2
 * l3 = side 3
 * h  = height/thickness
 * rad = radius of rounded corners
 */
module rounded_triangle(l1,l2,l3,h,rad)
{
  // Compute rotation angles
  al3 = acos((l1*l1 + l2*l2 - l3*l3)/(2 * l1 * l2));
  al1 = acos((l2*l2 + l3*l3 - l1*l1)/(2 * l2 * l3));
  al2 = acos((l3*l3 + l1*l1 - l2*l2)/(2 * l3 * l1));
  // Setup bars for edges
  translate([0,0,0])
    rotate([0,0,0])
      rounded_bar(rad,l3,h);
  translate([l3,0,0])
    rotate([0,0,180-al2])
      rounded_bar(rad,l1,h);
  rotate([0,0,al1])
    translate([l2,0,0])
      rotate([0,0,180])
        rounded_bar(rad,l2,h);
  // Fill in center
    triangle(l1,l2,l3,h);
}
/* ***** triangle *****
 * l1 = side 1
 * l2 = side 2
 * l3 = side 3
 * h  = height/thickness
 * triangle(l1,l2,l3,h);
 */
module triangle(l1,l2,l3,h)
{
  // Compute rotation angle
  al1 = acos((l2*l2 + l3*l3 - l1*l1)/(2 * l2 * l3));
  
  linear_extrude(height = h)
  polygon(points = [[0,0],[l3,0],[l2*cos(al1),l2*sin(al1)]]);
}
/* ***** chamfered hole *****
 * Punch hole with chamfer on one end
 * d1 = main hole diameter
 * d2 = hole diameter at chamfered end
 * ht1 = height of whole hole
 * ht2 = depth of  chamfer
*/
module chamfered_hole(d1,d2,ht1,ht2)
{
   rotate_extrude(convexity = 10)
     polygon(points = [[0,0],[d1/2,0],[d1/2,ht1-ht2],[d2/2,ht1],[0,ht1]]);

}

/* ***** fillet *****
 * r = radius of fillet
 * l = length of fillet
 fillet (r,l);
*/
module fillet(r,l)
{
   difference()
   {
     union()
     {
       cube([2*r,2*r,l]);
     }
     union()
     {
       translate ([r,r,0])
           cylinder(d = 2*r + 0.1, h = l, center = false);
       translate([r,0,0])
           cube([r,2*r,l],center = false);
       translate([0,r,0])
           cube([2*r,r,l],center = false);
     }
   }
}
/* ***** circular chamfer *****
 * d = outer diameter
 * rad = chamfer radius
 * circular_chamfer(d, rad);
*/
module circular_chamfer(d, rad)
{
  ofs = (d/2 - rad);
  rotate_extrude()
  translate([ofs,0])
   difference()
   {
     union()
     {
       square(size = [rad, rad]);
     }
     union()
     {
       translate ([0,rad ])
           circle(d = 2*rad + 0.1);
     }
   }
}
module circular_inner_chamfer(d, rad)
{
  circular_chamfer(d, rad);
} 

/* ***** circular chamfer *****
 * d = inner diameter
 * rad = chamfer radius
 * circular_chamfer(d, rad);
*/
module circular_outer_chamfer(d, rad)
{
  ofs = (d/2 - rad);
  rotate_extrude()
  translate([ofs,0])
   difference()
   {
     union()
     {
       square(size = [rad, rad]);
     }
     union()
     {
       translate ([rad,rad ])
           circle(d = 2*rad + 0.1);
     }
   }
}
// main file
/* File: pwrX2plt.scad
 * Power unit: diode and MOV mount plate
 * Author: deh
 * Latest edit: 20180603
 * 
 */

include <../library_deh/deh_shapes.scad>
include <../library_deh/deh_shapes2.scad>
include <../library_deh/Plano_frame.scad>
include <../library_deh/fasteners.scad>
include <../library_deh/ridged_screw_hole.scad>

 $fn=50;

plt3_len = 52+2.5;
plt3_wid = 52;

plt3_crn_thx = 7.0;
plt3_crn_wid = 8.0*1.4;
plt3_crn_len =  8.0*1.4;

j = 0.5;

module corner_post(dx,dy,theta)
{
/* ***** wedge *****
 * l = length
 * w = width
 * h = height/thickness
 * wedge(l, w, h)
*/
	translate([dx,dy,plt3_crn_thx])
		rotate([0,90,theta])
			wedge(plt3_crn_thx,plt3_crn_wid,plt3_crn_len);

}
module corner_posts()
{
	ofx = (plt3_len-j)/2 - plt3_crn_len;
	ofy = (plt3_wid-j)/2;

	corner_post(-ofx-plt3_crn_len, ofy-plt3_crn_wid,0);
	corner_post(-ofx,-ofy, 90);

	corner_post( ofx, ofy,-90);
	corner_post( ofx+plt3_crn_len,-ofy+plt3_crn_wid,180);

}
plt3_hole_d = 2.8;
module corner_posts_holes()
{
	ofs = 3;
	ofx = plt3_len/2 - ofs;
	ofy = plt3_wid/2 - ofs;
	d1 = plt3_hole_d;
	translate([ ofx, ofy, 0]) cylinder(d=d1,h=50,center=true);
	translate([-ofx, ofy, 0]) cylinder(d=d1,h=50,center=true);
	translate([ ofx,-ofy, 0]) cylinder(d=d1,h=50,center=true);
	translate([-ofx,-ofy, 0]) cylinder(d=d1,h=50,center=true);

}

module d_plate2()
{

	difference()
	{
		union()
		{
			thx1 = 3;
			ofz1 = thx1/2;
			translate([0,0,ofz1])
				cube([plt3_len-j,plt3_wid-j,thx1],center=true);
		}

		union()
		{
			k = 8.0;	// Edge ridge width
			len2 = plt3_len - k - j;
			wid2 = plt3_wid - k - j;
		   cube([len2,wid2,50],center=true);
		}
	}	
}
module total()
{
	difference()
	{
		union()
		{
			d_plate2();
			corner_posts();
		}

		union()
		{
			corner_posts_holes();
		}
	}	
}
total();
